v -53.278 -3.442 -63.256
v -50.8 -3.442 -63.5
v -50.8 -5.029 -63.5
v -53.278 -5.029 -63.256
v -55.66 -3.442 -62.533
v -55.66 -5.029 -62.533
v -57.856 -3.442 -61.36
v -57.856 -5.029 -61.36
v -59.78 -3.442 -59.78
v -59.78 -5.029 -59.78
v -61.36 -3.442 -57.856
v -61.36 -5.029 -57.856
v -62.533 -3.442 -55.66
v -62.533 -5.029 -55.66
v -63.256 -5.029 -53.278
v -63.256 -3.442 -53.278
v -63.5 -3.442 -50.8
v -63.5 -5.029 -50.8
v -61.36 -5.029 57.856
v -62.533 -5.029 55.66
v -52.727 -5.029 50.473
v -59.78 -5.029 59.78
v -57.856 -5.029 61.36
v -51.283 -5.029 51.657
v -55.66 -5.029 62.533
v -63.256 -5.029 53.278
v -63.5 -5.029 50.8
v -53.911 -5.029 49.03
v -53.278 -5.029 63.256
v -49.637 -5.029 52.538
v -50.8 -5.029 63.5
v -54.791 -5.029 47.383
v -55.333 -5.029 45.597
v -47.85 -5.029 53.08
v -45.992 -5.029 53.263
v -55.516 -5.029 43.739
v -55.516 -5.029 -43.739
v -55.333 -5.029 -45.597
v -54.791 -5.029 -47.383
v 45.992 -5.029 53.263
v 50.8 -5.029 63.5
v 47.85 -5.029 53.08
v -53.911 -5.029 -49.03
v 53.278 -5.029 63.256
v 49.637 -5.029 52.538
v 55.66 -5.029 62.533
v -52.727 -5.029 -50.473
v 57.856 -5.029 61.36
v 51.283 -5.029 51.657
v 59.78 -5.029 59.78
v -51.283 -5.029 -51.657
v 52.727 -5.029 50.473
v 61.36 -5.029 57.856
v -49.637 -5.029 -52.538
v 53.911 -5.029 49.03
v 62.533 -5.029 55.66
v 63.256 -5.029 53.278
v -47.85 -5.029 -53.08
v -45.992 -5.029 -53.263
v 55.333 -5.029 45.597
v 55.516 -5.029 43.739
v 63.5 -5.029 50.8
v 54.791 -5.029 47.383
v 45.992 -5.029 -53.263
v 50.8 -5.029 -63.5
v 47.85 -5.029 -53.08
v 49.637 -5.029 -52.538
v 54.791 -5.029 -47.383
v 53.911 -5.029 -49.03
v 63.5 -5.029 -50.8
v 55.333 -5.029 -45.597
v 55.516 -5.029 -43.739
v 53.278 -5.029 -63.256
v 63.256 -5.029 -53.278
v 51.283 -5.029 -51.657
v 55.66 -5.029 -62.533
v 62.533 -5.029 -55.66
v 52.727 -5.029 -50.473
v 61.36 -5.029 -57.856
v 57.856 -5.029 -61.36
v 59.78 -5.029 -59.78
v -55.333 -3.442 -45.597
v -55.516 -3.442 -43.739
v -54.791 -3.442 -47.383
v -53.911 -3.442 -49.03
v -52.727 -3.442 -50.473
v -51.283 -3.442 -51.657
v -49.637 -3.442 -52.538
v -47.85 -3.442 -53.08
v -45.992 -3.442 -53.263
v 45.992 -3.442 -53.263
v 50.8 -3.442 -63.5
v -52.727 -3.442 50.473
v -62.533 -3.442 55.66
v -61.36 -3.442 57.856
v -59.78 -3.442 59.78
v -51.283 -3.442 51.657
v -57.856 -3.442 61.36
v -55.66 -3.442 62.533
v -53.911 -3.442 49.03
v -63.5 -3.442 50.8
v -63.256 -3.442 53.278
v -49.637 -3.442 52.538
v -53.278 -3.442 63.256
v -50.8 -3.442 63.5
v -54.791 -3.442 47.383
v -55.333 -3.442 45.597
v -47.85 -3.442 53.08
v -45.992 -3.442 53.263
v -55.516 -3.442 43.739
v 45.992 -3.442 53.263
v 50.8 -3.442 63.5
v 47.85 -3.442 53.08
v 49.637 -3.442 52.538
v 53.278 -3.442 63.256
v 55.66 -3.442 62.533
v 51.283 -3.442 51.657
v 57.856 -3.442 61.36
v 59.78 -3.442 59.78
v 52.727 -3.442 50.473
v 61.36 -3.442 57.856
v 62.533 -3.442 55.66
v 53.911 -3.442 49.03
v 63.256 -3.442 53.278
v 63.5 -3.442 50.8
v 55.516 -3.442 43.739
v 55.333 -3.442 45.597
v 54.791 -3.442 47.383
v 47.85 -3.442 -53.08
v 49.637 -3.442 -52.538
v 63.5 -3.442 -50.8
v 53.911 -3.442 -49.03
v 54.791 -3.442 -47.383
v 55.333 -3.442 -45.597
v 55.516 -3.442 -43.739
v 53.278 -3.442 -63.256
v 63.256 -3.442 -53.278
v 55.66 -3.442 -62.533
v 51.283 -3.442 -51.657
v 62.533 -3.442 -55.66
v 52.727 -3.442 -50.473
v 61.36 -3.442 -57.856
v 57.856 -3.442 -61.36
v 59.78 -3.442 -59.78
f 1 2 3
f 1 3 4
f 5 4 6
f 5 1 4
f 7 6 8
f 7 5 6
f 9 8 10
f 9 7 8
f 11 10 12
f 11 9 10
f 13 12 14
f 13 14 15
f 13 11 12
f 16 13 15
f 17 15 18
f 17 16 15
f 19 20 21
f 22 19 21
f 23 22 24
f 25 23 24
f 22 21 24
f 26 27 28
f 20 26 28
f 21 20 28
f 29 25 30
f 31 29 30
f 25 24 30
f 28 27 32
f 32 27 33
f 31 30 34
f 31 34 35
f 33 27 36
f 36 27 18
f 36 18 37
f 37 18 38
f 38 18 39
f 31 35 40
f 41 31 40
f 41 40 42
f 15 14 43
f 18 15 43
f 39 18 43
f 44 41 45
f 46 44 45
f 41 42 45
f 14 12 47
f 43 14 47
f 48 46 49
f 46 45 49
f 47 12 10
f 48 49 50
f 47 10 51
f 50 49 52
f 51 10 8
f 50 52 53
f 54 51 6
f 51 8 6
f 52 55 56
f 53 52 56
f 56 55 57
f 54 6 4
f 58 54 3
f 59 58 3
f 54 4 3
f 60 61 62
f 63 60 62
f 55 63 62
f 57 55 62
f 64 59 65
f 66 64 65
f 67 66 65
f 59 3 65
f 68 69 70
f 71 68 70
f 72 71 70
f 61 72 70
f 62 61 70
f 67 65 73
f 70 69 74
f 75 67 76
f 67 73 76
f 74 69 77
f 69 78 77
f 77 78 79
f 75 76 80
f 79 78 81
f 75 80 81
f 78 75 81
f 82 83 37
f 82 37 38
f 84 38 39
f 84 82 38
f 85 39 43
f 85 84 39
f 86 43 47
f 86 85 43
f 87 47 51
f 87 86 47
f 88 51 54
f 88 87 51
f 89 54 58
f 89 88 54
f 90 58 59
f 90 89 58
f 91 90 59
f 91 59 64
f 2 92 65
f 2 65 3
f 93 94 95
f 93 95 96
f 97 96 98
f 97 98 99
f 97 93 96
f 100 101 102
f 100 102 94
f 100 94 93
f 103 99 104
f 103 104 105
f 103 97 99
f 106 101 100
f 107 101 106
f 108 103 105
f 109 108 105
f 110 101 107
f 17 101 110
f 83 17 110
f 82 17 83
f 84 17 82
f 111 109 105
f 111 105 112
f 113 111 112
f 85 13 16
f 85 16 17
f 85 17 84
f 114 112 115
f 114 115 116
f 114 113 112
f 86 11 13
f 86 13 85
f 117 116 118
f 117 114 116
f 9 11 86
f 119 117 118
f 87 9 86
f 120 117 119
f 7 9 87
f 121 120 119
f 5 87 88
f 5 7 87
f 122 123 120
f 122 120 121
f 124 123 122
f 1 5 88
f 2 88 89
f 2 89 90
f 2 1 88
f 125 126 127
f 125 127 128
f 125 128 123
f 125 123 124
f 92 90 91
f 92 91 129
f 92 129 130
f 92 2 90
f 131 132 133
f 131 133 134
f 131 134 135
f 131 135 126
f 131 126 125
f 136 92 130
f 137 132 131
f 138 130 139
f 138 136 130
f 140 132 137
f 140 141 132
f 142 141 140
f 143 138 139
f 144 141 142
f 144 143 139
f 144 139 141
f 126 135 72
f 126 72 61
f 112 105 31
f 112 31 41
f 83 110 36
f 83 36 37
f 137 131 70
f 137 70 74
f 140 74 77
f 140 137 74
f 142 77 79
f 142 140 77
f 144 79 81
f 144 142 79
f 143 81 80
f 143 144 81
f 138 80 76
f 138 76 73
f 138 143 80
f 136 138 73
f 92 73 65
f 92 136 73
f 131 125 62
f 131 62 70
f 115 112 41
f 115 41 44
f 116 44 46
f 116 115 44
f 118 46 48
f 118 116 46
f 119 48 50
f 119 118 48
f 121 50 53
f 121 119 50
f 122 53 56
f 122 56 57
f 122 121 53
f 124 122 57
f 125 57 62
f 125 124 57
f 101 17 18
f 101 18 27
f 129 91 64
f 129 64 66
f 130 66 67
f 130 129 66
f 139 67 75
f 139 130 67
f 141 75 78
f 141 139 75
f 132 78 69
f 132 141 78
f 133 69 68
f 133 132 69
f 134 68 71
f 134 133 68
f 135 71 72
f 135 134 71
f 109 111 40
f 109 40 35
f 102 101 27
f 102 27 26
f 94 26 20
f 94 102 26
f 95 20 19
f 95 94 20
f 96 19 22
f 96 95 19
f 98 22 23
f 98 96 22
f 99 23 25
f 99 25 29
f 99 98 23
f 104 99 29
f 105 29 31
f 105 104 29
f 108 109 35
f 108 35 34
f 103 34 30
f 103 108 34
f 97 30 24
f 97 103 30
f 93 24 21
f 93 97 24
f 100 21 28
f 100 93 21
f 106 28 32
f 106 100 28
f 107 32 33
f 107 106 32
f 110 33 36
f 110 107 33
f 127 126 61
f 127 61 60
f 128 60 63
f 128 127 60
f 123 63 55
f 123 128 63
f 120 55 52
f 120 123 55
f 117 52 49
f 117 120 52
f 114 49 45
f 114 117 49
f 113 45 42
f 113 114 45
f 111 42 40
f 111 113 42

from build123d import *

# Parameters (mm, degrees)
MAINBODY_DEPTH = 1.5875


with BuildPart() as part:
    # Sketch2 → MainBody (new body)
    with BuildSketch(Plane(origin=(0, -3.4417, 0), x_dir=(-1, 0, 0), z_dir=(0, -1, 0))):
        with BuildLine():
            Line((-50.8, 63.5), (50.8, 63.5))
            ThreePointArc((50.8, 63.5), (59.780256121, 59.780256121), (63.5, 50.8))
            Line((63.5, 50.8), (63.5, -50.8))
            ThreePointArc((63.5, -50.8), (59.780256121, -59.780256121), (50.8, -63.5))
            Line((50.8, -63.5), (-50.8, -63.5))
            ThreePointArc((-50.8, -63.5), (-59.780256121, -59.780256121), (-63.5, -50.8))
            Line((-63.5, -50.8), (-63.5, 50.8))
            ThreePointArc((-63.5, 50.8), (-59.780256121, 59.780256121), (-50.8, 63.5))
        make_face()
        with BuildLine():
            Line((45.992219207, 53.26253), (-45.992219207, 53.26253))
            ThreePointArc((-45.992219207, 53.26253), (-52.726513272, 50.473094065), (-55.515949207, 43.7388))
            Line((-55.515949207, 43.7388), (-55.515949207, -43.7388))
            ThreePointArc((-55.515949207, -43.7388), (-52.726513272, -50.473094065), (-45.992219207, -53.26253))
            Line((-45.992219207, -53.26253), (45.992219207, -53.26253))
            ThreePointArc((45.992219207, -53.26253), (52.726513272, -50.473094065), (55.515949207, -43.7388))
            Line((55.515949207, -43.7388), (55.515949207, 0))
            Line((55.515949207, 0), (55.515949207, 43.7388))
            ThreePointArc((55.515949207, 43.7388), (52.726513272, 50.473094065), (45.992219207, 53.26253))
        make_face(mode=Mode.SUBTRACT)
    extrude(amount=MAINBODY_DEPTH)


solid = part.part
